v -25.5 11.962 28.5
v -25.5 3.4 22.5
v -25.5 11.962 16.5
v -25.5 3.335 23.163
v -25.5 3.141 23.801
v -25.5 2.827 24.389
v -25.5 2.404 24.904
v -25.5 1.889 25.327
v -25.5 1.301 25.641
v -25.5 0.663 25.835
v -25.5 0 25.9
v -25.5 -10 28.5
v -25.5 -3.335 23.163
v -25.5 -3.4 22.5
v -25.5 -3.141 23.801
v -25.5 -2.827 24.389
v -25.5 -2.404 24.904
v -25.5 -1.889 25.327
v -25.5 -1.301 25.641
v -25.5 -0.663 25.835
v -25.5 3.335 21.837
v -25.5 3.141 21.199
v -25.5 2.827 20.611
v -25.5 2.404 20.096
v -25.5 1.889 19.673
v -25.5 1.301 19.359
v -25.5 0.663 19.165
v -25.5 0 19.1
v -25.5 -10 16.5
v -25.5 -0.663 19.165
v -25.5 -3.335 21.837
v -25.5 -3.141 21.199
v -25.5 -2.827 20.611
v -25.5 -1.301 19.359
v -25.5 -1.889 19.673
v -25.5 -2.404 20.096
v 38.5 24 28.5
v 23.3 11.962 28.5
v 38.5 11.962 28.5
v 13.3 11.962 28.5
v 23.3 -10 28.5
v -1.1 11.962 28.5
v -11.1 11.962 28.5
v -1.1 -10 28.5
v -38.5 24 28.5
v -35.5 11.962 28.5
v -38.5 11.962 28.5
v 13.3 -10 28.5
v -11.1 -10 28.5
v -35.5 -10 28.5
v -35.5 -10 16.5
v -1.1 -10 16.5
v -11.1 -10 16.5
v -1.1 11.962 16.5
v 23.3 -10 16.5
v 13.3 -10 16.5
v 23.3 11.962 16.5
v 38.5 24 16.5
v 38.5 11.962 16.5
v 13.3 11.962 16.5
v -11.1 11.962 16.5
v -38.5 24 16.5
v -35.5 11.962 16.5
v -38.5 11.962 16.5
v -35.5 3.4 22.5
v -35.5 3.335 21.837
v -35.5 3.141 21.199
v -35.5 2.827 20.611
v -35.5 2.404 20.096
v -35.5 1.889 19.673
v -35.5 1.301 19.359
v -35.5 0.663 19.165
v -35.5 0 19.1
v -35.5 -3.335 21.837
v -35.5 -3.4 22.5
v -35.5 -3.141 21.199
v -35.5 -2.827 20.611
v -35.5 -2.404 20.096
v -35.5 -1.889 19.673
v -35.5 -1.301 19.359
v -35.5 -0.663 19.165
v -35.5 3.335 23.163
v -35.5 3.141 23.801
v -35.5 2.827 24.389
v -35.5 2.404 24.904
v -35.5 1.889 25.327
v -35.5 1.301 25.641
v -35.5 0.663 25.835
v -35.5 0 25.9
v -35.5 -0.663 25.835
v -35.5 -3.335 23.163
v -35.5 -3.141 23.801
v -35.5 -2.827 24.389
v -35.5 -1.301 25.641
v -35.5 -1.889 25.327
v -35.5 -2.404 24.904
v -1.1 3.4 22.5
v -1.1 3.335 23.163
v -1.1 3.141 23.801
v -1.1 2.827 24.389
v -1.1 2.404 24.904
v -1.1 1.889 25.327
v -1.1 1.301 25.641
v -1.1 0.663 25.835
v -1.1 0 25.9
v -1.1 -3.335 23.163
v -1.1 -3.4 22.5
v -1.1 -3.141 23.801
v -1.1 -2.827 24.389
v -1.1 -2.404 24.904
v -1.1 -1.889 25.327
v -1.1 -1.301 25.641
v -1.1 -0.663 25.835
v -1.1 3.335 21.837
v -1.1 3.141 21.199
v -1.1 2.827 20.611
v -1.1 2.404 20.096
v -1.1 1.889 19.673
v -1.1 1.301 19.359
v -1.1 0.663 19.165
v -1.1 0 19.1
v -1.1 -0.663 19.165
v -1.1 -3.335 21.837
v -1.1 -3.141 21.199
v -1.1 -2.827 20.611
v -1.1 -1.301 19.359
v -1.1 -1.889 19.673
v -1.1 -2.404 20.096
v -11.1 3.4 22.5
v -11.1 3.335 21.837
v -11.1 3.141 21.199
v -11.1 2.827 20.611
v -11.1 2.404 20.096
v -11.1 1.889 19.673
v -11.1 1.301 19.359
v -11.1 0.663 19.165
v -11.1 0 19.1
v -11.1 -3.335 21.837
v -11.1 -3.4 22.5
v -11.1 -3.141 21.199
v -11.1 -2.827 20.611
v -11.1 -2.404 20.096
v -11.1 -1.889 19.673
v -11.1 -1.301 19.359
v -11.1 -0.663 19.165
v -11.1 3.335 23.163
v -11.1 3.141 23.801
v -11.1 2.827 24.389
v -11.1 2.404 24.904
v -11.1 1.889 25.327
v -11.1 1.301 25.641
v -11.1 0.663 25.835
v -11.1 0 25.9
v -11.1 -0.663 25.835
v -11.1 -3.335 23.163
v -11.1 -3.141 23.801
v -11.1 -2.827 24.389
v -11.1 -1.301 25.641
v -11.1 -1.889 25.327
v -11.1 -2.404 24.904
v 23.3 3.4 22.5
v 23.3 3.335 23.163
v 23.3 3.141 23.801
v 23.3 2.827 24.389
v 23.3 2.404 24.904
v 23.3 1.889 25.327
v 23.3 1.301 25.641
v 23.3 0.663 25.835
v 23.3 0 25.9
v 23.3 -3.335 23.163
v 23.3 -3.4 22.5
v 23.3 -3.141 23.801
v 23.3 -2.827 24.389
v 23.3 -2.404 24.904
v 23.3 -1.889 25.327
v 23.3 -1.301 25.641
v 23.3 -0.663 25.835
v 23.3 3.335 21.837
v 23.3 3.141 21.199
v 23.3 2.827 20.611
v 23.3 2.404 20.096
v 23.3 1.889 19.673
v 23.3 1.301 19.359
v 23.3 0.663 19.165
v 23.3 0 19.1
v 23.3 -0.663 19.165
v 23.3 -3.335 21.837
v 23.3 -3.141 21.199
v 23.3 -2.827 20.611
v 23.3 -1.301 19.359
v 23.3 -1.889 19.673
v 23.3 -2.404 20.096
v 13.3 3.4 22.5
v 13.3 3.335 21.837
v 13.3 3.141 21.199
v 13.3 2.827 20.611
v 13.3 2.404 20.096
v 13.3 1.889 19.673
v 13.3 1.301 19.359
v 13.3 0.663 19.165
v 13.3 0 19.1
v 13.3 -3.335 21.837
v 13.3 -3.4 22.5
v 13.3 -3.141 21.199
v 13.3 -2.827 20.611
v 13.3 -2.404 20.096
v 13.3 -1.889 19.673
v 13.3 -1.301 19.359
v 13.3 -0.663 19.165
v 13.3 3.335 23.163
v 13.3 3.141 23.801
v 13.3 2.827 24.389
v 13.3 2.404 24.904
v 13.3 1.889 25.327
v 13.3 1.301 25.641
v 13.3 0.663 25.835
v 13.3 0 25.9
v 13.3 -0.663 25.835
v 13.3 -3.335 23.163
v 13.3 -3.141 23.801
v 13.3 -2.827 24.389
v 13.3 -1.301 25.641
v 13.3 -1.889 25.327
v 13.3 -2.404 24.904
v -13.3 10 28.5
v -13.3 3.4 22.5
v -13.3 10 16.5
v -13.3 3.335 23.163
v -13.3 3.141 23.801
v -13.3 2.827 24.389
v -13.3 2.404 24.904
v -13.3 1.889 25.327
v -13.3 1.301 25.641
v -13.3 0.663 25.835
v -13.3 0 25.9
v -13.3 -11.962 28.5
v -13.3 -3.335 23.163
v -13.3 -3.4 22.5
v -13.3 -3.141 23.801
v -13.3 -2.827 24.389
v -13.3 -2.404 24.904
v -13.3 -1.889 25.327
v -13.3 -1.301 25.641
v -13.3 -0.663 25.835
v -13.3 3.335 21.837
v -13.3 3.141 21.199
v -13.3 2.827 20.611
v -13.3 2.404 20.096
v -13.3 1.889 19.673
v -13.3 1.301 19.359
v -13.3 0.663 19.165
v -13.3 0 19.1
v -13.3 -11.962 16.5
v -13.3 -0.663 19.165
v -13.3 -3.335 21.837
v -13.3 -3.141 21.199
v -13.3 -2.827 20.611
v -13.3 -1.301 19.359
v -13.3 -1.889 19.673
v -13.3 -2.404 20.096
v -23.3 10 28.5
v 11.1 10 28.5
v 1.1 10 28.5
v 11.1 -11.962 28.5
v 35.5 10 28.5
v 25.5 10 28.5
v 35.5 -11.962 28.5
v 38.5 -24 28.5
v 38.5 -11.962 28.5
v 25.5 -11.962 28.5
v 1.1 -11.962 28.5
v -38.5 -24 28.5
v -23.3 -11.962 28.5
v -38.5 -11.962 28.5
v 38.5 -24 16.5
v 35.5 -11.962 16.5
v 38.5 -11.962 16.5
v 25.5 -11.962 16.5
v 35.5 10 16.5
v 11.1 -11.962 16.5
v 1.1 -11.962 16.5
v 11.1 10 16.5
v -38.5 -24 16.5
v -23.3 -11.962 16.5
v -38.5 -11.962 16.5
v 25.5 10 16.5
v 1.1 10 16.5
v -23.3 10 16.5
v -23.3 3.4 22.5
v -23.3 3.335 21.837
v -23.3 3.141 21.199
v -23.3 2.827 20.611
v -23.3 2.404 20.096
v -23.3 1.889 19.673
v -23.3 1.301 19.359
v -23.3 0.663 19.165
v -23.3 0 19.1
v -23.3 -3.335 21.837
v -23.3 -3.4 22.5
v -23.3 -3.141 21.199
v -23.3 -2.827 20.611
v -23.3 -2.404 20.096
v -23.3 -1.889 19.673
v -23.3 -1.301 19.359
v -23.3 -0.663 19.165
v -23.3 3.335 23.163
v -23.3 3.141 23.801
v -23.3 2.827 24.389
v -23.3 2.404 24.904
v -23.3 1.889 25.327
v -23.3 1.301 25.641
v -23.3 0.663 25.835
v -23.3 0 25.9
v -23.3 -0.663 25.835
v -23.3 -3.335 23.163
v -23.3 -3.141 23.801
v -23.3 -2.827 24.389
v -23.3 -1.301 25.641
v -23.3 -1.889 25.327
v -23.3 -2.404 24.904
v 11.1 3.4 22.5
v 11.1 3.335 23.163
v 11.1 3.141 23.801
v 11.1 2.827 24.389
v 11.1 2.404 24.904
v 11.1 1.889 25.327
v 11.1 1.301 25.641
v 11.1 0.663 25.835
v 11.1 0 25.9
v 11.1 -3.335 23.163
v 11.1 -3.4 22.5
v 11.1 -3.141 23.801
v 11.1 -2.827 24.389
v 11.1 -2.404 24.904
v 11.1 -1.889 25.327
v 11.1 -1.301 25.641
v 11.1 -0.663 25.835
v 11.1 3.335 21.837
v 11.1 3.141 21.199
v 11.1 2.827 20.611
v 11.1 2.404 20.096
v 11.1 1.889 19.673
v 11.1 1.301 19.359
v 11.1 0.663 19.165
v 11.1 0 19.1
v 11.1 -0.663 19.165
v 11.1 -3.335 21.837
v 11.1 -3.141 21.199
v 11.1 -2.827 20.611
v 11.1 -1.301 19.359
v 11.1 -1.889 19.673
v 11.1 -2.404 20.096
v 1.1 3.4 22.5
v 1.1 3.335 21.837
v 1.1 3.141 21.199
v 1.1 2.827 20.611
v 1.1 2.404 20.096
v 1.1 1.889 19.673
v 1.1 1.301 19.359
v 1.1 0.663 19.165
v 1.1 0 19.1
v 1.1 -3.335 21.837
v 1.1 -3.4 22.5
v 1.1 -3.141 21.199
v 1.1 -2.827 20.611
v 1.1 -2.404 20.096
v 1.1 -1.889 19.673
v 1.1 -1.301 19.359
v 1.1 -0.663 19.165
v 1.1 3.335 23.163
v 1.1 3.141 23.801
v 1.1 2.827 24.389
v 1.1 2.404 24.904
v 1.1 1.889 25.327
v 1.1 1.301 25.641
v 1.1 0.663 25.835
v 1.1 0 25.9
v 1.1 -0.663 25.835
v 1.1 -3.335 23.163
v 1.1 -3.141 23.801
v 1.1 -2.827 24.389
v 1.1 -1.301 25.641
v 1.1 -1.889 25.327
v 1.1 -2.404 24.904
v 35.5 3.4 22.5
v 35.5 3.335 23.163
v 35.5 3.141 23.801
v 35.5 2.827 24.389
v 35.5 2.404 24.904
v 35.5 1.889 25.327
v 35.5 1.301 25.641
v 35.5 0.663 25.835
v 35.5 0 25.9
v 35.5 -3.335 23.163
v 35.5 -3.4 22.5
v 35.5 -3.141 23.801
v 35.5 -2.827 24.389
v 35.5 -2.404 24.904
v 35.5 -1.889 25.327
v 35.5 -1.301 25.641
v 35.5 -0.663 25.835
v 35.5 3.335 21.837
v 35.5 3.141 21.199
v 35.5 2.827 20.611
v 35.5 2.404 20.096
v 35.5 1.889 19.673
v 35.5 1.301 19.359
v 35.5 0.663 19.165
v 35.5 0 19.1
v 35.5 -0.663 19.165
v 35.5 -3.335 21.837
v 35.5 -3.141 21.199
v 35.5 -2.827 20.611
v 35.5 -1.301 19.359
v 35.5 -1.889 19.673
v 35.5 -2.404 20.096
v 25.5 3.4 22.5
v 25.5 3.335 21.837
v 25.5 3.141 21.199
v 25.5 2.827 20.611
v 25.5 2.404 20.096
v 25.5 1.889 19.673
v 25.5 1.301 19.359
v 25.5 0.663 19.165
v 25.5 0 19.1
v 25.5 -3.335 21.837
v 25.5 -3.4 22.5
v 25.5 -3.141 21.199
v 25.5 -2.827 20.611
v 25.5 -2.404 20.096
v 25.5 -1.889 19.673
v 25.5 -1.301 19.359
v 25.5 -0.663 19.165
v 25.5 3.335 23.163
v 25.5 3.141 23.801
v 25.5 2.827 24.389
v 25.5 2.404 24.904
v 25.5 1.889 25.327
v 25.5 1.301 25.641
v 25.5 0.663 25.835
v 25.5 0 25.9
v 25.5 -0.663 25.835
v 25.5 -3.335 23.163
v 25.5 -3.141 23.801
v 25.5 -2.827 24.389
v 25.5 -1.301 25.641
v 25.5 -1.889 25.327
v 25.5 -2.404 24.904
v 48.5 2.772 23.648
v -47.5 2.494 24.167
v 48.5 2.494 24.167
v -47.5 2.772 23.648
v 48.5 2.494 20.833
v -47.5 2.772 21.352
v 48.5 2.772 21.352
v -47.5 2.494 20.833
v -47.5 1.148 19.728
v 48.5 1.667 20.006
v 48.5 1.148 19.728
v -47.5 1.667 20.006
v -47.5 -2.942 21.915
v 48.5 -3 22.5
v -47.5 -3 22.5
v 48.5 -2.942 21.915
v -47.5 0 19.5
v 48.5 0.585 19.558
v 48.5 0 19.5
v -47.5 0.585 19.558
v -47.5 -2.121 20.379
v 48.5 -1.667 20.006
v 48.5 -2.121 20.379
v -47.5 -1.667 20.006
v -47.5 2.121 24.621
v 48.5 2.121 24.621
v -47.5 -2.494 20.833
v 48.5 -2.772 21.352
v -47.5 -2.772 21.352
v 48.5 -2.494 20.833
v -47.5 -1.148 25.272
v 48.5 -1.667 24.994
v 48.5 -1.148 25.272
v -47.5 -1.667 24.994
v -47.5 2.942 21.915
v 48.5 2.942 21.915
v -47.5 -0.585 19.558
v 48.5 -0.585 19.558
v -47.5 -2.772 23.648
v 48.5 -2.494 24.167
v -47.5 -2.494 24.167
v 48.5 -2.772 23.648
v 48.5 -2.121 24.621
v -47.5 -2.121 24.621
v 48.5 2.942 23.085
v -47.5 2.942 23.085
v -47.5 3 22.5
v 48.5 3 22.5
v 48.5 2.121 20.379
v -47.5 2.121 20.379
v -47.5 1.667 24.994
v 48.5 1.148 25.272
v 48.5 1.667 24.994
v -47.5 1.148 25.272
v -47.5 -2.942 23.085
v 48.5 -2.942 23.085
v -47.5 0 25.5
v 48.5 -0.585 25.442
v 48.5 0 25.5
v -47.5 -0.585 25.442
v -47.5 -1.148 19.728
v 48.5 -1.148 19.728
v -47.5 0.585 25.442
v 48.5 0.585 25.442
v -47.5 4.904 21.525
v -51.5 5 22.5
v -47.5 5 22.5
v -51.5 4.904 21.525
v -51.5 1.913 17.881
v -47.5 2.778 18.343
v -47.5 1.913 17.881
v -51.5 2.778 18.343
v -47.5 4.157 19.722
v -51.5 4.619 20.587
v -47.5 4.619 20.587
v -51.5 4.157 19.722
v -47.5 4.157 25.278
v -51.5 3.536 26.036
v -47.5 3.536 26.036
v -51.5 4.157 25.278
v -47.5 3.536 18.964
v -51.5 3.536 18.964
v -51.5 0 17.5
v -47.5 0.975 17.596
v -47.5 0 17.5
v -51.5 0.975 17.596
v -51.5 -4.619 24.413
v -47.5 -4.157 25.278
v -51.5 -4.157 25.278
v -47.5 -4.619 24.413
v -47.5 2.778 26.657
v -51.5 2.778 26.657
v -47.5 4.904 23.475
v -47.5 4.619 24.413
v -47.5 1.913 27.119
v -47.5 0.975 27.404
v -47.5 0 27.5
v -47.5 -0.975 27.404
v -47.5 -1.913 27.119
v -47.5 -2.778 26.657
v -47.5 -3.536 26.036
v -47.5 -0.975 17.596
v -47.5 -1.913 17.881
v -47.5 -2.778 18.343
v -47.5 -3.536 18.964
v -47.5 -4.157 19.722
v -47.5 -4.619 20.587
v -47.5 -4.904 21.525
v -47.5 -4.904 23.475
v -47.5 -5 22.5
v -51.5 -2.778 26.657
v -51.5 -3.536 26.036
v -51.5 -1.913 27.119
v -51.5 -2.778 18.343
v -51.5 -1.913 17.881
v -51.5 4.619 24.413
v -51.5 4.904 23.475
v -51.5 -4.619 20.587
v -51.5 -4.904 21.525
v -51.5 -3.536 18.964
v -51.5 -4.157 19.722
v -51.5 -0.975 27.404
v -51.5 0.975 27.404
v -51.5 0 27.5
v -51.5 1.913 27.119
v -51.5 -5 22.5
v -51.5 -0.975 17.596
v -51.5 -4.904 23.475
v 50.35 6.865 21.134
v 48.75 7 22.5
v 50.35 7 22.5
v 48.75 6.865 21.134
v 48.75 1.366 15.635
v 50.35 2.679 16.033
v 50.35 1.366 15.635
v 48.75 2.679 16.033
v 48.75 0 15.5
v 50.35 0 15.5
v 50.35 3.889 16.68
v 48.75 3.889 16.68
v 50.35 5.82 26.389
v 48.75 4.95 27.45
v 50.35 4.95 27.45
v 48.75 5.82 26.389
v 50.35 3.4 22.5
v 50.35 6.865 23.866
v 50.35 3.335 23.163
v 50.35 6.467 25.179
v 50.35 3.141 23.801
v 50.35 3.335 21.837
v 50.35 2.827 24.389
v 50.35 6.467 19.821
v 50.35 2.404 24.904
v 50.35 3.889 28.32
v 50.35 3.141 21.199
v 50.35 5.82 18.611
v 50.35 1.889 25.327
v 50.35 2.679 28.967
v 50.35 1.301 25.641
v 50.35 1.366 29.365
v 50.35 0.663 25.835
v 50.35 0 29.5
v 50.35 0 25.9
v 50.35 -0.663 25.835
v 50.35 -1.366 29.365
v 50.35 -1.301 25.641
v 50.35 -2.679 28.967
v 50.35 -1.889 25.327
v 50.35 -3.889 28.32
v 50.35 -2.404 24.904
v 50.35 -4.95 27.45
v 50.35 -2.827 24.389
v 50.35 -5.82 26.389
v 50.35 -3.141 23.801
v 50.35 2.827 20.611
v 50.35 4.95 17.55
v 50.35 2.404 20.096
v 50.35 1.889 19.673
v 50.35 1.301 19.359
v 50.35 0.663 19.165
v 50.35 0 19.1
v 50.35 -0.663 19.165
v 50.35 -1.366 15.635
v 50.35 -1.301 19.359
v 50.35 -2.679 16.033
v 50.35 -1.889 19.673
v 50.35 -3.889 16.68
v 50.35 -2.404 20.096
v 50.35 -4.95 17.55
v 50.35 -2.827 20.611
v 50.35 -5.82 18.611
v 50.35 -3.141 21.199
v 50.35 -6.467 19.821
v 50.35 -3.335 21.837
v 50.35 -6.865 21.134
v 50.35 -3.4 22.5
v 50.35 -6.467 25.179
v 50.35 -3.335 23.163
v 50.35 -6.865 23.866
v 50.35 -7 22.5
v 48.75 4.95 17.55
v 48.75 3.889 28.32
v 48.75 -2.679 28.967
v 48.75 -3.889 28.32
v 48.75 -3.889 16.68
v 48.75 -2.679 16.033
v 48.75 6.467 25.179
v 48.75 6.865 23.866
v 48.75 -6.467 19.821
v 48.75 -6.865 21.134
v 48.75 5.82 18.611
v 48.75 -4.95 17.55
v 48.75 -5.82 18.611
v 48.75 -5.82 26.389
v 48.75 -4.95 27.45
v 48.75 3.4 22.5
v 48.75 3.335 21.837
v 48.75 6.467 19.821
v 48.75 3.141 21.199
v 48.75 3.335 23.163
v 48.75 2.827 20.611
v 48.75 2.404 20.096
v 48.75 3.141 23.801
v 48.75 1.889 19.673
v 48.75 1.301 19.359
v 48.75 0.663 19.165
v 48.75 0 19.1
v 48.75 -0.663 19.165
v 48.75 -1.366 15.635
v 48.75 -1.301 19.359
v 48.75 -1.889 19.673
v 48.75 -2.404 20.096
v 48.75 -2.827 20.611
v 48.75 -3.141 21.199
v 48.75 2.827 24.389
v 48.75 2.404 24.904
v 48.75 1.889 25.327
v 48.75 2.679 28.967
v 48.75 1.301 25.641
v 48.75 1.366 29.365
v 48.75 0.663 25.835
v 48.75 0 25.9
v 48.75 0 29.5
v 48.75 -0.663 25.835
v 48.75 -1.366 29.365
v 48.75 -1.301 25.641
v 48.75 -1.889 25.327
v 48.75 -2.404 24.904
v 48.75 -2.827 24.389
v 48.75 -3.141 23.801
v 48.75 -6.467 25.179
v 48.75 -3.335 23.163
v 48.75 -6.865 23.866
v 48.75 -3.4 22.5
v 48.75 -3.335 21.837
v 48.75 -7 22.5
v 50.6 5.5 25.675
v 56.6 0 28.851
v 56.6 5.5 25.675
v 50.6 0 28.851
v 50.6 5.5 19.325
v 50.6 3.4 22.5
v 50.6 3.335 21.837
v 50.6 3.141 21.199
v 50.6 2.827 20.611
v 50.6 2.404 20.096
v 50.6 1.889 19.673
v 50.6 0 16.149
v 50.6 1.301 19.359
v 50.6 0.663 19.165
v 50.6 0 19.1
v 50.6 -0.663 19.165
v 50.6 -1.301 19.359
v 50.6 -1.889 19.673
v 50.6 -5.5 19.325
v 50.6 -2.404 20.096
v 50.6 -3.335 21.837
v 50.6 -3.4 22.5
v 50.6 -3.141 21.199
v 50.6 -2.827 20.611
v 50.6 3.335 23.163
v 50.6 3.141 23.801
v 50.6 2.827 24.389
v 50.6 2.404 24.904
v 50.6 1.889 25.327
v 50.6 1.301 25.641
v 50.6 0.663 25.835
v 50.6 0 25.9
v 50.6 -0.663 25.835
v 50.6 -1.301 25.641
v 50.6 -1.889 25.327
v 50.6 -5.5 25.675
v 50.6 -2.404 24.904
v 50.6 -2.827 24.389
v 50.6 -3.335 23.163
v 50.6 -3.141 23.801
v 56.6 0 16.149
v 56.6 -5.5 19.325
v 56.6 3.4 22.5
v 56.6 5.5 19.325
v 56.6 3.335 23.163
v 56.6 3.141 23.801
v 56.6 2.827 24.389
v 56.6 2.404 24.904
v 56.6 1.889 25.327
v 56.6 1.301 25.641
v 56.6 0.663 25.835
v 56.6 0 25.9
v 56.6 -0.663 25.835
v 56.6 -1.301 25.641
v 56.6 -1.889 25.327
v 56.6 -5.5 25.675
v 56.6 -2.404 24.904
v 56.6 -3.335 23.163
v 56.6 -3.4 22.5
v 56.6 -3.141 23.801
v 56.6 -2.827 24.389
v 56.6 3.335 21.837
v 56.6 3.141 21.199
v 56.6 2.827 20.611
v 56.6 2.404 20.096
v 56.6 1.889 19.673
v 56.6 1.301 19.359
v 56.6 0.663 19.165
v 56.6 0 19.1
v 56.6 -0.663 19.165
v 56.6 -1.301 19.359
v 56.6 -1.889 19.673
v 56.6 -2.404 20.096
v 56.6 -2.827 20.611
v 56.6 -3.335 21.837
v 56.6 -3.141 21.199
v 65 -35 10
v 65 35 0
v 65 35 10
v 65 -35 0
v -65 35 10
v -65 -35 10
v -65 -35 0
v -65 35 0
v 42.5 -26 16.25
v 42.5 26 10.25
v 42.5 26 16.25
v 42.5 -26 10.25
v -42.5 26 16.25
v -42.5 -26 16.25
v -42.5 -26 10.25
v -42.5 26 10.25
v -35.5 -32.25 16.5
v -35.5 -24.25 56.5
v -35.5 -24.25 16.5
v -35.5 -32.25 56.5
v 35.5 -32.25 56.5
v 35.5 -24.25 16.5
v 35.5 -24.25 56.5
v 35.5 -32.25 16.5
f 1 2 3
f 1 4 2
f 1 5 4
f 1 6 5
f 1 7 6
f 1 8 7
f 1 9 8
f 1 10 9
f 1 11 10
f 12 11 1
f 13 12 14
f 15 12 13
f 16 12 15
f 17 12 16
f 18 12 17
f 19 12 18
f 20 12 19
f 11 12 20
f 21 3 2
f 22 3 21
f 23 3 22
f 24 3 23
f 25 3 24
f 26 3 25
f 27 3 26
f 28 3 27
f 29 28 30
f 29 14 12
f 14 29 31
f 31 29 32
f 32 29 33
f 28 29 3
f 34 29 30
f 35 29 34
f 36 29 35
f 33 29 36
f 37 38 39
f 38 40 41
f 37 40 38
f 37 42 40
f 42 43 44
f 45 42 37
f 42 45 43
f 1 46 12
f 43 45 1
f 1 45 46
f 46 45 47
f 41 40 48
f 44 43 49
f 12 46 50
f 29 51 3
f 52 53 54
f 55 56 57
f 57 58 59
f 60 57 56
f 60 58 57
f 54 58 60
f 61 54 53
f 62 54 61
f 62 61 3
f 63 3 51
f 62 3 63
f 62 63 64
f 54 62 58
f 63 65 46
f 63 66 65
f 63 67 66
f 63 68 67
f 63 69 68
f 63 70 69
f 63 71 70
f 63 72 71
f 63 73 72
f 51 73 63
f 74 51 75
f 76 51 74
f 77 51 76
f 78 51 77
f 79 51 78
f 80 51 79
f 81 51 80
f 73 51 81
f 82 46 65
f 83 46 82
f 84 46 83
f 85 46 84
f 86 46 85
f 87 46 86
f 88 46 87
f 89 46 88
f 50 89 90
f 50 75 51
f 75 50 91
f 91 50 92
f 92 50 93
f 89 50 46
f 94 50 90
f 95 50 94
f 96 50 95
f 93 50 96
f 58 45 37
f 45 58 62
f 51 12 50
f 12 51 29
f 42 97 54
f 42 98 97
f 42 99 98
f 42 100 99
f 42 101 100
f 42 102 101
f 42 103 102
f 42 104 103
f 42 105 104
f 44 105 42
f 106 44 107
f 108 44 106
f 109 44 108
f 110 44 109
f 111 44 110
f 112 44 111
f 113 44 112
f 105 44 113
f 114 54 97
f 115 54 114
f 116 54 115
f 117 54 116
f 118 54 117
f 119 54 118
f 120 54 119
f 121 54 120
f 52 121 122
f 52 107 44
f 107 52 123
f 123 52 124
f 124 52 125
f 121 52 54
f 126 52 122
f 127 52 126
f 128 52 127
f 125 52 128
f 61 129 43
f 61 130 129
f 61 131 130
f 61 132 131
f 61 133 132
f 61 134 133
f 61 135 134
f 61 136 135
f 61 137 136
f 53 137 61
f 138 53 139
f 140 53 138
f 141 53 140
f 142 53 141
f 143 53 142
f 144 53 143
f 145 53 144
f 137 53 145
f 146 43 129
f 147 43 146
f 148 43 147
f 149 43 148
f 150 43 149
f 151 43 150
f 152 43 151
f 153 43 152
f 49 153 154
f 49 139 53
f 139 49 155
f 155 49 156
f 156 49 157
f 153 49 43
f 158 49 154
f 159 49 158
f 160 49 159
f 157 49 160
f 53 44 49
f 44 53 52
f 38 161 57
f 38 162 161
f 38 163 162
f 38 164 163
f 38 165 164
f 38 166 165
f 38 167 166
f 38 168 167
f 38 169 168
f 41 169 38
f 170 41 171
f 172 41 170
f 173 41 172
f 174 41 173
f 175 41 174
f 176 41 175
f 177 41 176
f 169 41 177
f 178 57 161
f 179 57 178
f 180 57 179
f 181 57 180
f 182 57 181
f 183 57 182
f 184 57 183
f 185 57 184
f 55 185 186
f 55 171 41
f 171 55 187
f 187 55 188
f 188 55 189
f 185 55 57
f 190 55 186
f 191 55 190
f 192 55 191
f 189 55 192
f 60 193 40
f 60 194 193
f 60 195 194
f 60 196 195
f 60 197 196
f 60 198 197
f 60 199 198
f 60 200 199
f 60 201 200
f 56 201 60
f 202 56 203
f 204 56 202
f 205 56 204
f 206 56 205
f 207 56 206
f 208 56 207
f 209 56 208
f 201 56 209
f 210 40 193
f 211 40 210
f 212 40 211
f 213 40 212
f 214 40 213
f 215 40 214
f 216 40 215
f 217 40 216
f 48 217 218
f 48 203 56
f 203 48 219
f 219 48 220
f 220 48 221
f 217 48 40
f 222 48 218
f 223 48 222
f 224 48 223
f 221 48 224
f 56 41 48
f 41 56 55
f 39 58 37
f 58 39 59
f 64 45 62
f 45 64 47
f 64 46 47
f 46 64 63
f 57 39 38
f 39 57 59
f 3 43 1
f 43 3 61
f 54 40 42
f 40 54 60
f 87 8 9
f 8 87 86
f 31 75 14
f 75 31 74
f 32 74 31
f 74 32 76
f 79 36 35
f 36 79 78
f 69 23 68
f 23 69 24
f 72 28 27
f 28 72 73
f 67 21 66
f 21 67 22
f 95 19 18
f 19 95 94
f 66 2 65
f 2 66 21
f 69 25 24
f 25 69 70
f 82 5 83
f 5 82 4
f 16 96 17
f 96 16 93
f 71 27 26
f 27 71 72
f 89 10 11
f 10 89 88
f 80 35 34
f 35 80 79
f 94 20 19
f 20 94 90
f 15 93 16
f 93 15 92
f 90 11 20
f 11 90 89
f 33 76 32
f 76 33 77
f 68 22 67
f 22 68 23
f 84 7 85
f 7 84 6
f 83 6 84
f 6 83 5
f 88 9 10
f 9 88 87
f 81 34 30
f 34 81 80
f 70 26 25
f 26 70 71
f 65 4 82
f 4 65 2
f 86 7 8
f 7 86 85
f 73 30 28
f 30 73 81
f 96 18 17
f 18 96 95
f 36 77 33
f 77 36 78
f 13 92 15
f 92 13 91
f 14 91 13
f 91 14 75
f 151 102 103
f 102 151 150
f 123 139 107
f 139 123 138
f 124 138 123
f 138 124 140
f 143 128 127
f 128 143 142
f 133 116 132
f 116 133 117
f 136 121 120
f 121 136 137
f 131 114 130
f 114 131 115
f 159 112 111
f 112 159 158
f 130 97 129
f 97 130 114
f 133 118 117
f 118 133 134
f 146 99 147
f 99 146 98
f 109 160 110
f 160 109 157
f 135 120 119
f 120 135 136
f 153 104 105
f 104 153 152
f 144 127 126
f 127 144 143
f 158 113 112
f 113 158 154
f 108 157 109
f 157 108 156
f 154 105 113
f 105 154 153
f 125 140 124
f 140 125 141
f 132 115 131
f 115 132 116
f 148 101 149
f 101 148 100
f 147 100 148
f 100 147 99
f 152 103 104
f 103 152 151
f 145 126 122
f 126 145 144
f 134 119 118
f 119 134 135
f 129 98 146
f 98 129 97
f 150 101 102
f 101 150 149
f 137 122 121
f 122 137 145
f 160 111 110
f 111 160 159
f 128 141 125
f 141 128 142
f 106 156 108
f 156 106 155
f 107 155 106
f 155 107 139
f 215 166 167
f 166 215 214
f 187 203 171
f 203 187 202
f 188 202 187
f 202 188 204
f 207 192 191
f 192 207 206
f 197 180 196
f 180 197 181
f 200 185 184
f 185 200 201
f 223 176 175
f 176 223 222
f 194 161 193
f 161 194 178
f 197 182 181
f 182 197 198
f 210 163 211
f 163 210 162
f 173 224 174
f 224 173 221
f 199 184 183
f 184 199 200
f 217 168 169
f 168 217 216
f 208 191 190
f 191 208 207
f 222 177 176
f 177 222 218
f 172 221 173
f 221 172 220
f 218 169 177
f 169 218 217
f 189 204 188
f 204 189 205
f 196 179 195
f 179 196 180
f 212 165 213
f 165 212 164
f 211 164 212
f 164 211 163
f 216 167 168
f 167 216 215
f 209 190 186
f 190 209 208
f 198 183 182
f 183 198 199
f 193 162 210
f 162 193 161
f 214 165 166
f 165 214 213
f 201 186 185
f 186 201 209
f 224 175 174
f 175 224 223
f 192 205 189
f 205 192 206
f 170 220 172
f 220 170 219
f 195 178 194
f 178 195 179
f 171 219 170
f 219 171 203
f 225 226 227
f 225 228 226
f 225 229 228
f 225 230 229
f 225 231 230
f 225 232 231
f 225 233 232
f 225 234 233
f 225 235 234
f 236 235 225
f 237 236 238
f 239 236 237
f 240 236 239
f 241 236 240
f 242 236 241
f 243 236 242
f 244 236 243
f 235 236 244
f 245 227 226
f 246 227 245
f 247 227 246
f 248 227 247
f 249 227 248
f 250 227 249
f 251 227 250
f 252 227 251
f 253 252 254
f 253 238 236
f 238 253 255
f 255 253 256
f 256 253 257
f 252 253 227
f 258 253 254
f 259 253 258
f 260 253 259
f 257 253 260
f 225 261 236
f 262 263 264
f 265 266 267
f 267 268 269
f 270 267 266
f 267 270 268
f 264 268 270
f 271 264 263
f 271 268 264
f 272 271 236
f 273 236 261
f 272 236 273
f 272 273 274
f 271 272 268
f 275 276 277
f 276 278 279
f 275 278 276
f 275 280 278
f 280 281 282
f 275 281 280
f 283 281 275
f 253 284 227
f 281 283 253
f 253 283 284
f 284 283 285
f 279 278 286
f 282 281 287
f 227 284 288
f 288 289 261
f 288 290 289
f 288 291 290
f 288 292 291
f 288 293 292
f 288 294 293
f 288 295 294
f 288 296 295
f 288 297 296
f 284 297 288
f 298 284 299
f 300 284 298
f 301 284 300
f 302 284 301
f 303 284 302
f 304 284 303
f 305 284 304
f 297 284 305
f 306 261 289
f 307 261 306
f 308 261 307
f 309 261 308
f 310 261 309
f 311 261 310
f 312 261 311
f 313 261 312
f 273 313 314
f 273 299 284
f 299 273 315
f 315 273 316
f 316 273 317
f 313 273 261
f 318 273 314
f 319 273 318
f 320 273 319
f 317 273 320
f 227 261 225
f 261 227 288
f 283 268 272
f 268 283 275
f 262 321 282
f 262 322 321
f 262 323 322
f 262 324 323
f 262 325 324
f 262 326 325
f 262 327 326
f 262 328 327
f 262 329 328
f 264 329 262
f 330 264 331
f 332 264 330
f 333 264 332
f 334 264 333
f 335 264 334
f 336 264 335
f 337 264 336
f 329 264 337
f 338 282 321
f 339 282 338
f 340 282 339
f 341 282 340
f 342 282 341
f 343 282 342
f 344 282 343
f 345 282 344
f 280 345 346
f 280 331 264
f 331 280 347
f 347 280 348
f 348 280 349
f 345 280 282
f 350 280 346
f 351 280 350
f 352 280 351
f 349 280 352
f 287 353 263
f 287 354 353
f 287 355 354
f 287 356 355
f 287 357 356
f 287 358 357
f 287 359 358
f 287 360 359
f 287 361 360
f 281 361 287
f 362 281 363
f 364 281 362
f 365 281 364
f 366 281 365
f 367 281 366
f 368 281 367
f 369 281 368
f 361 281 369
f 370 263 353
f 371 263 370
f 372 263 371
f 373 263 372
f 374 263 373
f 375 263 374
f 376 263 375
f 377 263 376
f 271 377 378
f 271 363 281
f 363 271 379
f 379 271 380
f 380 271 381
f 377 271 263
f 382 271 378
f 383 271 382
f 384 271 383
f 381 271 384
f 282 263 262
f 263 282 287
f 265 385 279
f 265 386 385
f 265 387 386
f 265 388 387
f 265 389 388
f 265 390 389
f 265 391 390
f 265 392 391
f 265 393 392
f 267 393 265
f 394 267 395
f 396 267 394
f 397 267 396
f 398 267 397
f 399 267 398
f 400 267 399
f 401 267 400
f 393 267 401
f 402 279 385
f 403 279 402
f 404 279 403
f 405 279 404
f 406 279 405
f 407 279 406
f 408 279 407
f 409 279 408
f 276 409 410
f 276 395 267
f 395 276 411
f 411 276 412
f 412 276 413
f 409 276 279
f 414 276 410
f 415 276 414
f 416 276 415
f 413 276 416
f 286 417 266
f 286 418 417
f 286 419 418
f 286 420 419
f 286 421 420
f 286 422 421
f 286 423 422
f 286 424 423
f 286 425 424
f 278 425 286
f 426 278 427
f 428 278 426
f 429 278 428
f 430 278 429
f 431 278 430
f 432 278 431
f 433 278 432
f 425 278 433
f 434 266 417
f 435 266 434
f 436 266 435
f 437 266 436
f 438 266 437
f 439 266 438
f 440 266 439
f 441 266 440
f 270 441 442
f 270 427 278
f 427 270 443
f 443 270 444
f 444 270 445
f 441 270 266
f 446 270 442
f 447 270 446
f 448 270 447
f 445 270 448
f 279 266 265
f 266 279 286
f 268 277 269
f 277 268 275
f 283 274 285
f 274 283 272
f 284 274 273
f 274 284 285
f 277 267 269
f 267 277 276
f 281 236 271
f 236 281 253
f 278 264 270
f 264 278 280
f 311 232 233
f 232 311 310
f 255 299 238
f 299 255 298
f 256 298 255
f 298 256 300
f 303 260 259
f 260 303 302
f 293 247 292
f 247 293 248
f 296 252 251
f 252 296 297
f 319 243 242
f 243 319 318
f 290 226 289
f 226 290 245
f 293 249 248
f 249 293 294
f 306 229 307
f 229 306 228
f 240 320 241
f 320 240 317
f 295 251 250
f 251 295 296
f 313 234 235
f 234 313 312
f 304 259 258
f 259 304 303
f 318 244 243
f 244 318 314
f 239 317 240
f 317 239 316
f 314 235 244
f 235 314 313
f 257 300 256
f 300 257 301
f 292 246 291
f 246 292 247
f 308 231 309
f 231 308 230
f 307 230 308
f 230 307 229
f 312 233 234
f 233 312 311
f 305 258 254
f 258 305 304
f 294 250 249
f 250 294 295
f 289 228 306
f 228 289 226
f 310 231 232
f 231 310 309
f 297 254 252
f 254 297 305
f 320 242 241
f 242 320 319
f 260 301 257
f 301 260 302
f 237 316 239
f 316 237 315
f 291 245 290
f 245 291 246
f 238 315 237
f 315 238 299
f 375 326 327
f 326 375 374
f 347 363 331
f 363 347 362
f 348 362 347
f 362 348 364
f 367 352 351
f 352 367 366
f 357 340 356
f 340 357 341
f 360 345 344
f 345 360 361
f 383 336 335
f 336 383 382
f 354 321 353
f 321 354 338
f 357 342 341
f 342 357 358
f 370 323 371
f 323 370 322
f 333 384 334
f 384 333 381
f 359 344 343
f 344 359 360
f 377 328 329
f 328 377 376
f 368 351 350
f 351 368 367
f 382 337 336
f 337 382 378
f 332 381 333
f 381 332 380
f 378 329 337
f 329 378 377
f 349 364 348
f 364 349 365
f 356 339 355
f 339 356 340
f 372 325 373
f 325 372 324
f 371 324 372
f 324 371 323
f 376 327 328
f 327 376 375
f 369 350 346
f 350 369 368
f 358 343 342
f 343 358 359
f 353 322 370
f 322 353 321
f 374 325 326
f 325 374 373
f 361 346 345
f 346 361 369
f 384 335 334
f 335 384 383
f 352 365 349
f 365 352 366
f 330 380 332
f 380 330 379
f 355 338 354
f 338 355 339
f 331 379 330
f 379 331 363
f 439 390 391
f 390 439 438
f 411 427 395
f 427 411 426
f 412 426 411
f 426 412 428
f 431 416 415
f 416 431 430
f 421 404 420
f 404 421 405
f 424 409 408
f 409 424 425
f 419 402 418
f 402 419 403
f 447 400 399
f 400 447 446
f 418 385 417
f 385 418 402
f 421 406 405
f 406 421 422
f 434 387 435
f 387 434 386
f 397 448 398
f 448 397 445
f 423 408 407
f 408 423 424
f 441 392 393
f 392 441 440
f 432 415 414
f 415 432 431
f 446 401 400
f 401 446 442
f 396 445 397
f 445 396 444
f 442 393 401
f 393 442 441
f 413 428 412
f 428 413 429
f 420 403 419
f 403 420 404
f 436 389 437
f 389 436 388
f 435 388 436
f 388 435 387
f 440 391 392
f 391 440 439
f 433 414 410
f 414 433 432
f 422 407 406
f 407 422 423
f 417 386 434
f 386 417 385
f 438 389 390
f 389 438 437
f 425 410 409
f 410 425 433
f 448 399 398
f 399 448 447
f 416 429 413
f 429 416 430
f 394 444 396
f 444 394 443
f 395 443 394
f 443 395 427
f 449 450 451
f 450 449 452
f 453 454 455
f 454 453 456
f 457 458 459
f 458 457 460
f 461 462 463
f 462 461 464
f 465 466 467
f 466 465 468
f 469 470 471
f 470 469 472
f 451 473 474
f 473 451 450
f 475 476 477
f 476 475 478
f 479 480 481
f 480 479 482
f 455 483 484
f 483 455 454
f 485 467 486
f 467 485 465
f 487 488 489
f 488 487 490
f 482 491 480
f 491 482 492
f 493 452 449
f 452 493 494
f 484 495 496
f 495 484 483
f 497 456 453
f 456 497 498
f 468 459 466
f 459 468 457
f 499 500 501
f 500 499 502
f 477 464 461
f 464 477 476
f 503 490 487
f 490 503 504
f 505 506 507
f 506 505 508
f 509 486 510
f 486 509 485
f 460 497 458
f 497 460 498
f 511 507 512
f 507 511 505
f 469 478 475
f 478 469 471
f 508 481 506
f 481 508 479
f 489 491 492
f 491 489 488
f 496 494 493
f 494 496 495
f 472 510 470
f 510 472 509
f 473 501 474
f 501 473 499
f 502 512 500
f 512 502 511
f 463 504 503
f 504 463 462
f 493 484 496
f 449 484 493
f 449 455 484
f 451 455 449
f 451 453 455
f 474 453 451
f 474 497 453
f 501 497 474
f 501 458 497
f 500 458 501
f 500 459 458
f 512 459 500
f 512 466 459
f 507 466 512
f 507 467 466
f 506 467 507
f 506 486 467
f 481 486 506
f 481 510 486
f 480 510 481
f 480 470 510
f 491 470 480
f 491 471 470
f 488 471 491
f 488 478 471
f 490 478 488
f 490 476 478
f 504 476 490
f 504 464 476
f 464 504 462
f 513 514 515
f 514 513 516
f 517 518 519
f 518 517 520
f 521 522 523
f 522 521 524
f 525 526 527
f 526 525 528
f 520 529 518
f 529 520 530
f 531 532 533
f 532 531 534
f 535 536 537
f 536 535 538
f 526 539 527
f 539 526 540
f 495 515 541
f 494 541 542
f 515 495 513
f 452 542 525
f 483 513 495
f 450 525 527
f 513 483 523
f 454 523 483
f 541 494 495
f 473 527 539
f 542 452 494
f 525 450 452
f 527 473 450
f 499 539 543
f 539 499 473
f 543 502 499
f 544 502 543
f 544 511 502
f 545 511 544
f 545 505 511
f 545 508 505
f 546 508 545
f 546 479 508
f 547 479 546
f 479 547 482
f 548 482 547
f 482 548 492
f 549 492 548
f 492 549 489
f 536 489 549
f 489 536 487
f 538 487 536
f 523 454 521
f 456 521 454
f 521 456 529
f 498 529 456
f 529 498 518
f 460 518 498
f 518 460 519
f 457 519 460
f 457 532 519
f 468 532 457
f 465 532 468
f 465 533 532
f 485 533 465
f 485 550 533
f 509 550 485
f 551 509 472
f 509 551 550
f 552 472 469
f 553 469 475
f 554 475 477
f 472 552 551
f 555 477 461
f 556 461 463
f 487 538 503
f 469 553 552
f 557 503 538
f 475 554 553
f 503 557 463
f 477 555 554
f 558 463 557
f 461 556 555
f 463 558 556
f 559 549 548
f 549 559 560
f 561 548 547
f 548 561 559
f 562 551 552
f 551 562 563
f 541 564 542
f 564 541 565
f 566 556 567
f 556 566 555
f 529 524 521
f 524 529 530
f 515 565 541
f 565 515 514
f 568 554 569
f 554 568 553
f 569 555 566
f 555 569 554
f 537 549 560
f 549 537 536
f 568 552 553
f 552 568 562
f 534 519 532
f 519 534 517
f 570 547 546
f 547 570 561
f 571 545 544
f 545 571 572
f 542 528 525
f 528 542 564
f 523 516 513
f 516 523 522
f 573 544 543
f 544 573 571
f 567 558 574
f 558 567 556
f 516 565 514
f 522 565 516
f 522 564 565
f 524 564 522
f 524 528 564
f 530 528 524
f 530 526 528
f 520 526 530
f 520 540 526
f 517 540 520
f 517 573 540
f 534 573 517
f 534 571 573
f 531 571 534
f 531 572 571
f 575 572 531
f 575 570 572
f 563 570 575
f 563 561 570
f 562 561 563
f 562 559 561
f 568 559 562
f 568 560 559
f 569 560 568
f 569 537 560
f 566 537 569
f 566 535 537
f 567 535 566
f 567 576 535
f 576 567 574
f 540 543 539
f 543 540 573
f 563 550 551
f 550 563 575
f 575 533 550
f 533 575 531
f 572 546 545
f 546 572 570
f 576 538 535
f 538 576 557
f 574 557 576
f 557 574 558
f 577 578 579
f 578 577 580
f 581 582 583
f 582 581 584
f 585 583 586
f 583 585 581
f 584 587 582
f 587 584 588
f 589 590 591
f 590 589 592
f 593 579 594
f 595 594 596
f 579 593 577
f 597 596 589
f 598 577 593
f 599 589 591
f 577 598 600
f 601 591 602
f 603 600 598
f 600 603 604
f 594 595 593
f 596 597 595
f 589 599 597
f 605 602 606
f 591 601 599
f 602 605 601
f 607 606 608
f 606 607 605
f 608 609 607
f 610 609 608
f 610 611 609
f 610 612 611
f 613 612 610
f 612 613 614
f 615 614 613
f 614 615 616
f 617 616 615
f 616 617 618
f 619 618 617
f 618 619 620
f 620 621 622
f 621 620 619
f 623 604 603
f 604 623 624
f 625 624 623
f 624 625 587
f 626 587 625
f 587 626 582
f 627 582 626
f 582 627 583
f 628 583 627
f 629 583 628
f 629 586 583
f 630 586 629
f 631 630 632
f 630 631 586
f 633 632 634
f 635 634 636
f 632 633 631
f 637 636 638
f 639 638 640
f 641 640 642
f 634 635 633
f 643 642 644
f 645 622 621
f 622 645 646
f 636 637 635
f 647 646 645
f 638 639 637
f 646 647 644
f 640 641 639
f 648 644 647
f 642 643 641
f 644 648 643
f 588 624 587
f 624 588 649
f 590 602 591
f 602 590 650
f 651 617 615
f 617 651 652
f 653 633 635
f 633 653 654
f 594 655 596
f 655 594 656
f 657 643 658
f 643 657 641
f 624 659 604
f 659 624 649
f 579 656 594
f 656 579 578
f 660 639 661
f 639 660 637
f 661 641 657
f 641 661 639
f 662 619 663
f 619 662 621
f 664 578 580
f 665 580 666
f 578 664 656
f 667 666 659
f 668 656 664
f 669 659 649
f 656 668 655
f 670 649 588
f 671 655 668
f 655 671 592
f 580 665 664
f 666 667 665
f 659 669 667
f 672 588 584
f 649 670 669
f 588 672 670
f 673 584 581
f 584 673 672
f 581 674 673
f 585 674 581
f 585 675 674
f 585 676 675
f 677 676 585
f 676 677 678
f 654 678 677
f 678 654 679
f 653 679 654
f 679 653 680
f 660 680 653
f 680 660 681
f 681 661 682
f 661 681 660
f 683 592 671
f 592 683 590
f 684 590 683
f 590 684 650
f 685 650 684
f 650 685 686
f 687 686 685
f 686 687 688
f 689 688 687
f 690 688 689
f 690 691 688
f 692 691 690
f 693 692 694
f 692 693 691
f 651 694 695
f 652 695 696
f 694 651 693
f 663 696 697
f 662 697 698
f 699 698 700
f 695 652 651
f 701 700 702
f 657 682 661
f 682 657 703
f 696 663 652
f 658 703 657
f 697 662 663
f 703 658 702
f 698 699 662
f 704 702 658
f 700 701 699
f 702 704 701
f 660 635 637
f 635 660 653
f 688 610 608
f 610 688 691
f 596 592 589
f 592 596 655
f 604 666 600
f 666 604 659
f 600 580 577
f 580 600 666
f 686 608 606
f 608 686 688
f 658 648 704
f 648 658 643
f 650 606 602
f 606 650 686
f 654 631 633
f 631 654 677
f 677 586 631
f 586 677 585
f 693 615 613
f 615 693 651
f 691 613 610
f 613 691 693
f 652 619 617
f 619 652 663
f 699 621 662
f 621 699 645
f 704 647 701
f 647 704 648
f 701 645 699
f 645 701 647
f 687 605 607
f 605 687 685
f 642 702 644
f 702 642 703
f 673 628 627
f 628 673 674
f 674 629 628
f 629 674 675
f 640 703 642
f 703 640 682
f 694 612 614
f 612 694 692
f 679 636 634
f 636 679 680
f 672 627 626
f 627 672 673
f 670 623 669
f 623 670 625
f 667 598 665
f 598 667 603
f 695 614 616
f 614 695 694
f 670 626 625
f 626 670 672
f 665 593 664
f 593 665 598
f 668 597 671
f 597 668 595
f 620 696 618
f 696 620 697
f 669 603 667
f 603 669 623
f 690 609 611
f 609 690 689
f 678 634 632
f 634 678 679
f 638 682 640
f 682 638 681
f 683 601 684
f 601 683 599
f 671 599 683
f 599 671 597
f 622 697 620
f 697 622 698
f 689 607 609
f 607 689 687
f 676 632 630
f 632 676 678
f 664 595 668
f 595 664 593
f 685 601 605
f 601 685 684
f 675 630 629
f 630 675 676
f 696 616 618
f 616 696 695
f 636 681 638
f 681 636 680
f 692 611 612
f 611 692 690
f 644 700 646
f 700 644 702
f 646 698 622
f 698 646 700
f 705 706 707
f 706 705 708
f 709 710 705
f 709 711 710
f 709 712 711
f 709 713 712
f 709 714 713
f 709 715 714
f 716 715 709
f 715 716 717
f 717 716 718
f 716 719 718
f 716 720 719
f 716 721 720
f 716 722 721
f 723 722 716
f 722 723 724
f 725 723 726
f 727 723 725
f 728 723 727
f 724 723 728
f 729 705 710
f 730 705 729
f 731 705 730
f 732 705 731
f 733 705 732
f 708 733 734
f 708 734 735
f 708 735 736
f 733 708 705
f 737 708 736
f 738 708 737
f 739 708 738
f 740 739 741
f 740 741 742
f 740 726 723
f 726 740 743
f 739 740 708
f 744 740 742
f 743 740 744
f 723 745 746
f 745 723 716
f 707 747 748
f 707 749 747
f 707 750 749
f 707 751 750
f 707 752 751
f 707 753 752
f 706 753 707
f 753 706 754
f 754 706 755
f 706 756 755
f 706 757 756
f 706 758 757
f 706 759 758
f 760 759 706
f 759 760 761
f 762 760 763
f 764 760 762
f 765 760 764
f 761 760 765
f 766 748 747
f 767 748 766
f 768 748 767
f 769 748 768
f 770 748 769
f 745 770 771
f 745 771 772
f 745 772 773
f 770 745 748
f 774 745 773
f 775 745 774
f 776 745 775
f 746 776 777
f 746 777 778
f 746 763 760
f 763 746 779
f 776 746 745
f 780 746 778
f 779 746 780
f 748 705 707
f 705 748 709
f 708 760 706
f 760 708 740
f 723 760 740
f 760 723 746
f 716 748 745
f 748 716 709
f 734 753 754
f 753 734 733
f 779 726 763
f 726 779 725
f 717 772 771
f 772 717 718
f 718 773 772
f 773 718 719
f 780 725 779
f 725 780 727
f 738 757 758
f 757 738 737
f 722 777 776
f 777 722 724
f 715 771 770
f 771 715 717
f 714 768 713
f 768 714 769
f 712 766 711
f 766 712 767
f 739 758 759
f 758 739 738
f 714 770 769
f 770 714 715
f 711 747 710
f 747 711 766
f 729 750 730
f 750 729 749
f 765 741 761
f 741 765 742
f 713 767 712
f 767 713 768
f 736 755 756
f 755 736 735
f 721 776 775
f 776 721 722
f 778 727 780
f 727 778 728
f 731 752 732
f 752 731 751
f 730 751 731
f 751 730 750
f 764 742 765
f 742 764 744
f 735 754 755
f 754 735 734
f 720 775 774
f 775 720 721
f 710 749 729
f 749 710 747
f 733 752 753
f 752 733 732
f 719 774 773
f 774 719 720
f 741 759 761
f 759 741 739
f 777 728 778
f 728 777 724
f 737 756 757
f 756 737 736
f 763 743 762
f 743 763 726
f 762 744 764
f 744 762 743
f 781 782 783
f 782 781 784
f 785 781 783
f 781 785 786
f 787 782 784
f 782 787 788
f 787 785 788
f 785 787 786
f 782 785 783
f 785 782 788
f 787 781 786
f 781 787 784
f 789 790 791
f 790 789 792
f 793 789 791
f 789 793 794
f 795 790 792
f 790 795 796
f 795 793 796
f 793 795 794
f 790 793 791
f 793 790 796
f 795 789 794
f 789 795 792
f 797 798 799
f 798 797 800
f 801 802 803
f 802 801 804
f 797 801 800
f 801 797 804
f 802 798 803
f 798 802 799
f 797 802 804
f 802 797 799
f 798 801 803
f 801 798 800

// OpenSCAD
$fn = 32;

// ------------------------------------------------------------------------
// Comb hinge with flap: leaf 77 x 24 mm, pin d6, flap 40 mm
// Every part is its own module, assembly() places every instance.
// ------------------------------------------------------------------------

// --- part 1 ---
module hinge_bed() {
  difference() {
    translate([-65, -35, 0]) cube([130, 70, 10]);
  }
}

// --- part 2 ---
module hinge_riser() {
  difference() {
    translate([-42.5, -26, 0]) cube([85, 52, 6]);
  }
}

// --- part 3 ---
module hinge_leaf_a() {
  difference() {
    union() {
      translate([-35.5, -10, -6]) cube([10, 34, 12]);
      translate([-11.1, -10, -6]) cube([10, 34, 12]);
      translate([13.3, -10, -6]) cube([10, 34, 12]);
      translate([-38.5, 11.962, -6]) cube([77, 12.038, 12]);
    }
    translate([-30.5, 0, 0]) rotate([0, 90, 0]) cylinder(h = 12, d = 6.8, center = true);
    translate([-6.1, 0, 0]) rotate([0, 90, 0]) cylinder(h = 12, d = 6.8, center = true);
    translate([18.3, 0, 0]) rotate([0, 90, 0]) cylinder(h = 12, d = 6.8, center = true);
  }
}

// --- part 4 ---
module hinge_leaf_b() {
  difference() {
    union() {
      translate([-23.3, -24, -6]) cube([10, 34, 12]);
      translate([1.1, -24, -6]) cube([10, 34, 12]);
      translate([25.5, -24, -6]) cube([10, 34, 12]);
      translate([-38.5, -24, -6]) cube([77, 12.038, 12]);
    }
    translate([-18.3, 0, 0]) rotate([0, 90, 0]) cylinder(h = 12, d = 6.8, center = true);
    translate([6.1, 0, 0]) rotate([0, 90, 0]) cylinder(h = 12, d = 6.8, center = true);
    translate([30.5, 0, 0]) rotate([0, 90, 0]) cylinder(h = 12, d = 6.8, center = true);
  }
}

// --- part 5 ---
module hinge_flap() {
  difference() {
    translate([-35.5, -20, 0]) cube([71, 40, 8]);
  }
}

// --- part 6 ---
module hinge_pin() {
  rotate([0, 90, 0]) cylinder(h = 97, d = 6, center = true);
  translate([-51.5, 0, 0]) rotate([0, 90, 0]) cylinder(h = 4, d = 10);
}

// --- part 7 ---
module pin_washer() {
  difference() {
      translate([0, 0, 0]) cylinder(h = 1.6, d = 14);
      translate([0, 0, -1]) cylinder(h = 3.6, d = 6.8);
    }
}

// --- part 8 ---
module pin_nut() {
  difference() {
    linear_extrude(height = 6) polygon(points = [[6.351, 0], [3.175, 5.5], [-3.175, 5.5], [-6.351, 0], [-3.175, -5.5], [3.175, -5.5]]);
    translate([0, 0, -1]) cylinder(h = 8, d = 6.8);
  }
}

// --- assembly ---
module assembly() {
  color([0.80, 0.24, 0.20]) translate([0, 0, 0]) rotate([0, 0, 0]) hinge_bed();
  color([0.20, 0.45, 0.75]) translate([0, 0, 10.25]) rotate([0, 0, 0]) hinge_riser();
  color([0.25, 0.62, 0.32]) translate([0, 0, 22.5]) rotate([0, 0, 0]) hinge_leaf_a();
  color([0.92, 0.70, 0.18]) translate([0, 0, 22.5]) rotate([0, 0, 0]) hinge_leaf_b();
  color([0.58, 0.35, 0.70]) translate([0, -24.25, 36.5]) rotate([90, 0, 0]) hinge_flap();
  color([0.16, 0.66, 0.66]) translate([0, 0, 22.5]) rotate([0, 0, 0]) hinge_pin();
  color([0.85, 0.48, 0.18]) translate([48.75, 0, 22.5]) rotate([0, 90, 0]) pin_washer();
  color([0.55, 0.60, 0.65]) translate([50.6, 0, 22.5]) rotate([0, 90, 0]) pin_nut();
}

assembly();
